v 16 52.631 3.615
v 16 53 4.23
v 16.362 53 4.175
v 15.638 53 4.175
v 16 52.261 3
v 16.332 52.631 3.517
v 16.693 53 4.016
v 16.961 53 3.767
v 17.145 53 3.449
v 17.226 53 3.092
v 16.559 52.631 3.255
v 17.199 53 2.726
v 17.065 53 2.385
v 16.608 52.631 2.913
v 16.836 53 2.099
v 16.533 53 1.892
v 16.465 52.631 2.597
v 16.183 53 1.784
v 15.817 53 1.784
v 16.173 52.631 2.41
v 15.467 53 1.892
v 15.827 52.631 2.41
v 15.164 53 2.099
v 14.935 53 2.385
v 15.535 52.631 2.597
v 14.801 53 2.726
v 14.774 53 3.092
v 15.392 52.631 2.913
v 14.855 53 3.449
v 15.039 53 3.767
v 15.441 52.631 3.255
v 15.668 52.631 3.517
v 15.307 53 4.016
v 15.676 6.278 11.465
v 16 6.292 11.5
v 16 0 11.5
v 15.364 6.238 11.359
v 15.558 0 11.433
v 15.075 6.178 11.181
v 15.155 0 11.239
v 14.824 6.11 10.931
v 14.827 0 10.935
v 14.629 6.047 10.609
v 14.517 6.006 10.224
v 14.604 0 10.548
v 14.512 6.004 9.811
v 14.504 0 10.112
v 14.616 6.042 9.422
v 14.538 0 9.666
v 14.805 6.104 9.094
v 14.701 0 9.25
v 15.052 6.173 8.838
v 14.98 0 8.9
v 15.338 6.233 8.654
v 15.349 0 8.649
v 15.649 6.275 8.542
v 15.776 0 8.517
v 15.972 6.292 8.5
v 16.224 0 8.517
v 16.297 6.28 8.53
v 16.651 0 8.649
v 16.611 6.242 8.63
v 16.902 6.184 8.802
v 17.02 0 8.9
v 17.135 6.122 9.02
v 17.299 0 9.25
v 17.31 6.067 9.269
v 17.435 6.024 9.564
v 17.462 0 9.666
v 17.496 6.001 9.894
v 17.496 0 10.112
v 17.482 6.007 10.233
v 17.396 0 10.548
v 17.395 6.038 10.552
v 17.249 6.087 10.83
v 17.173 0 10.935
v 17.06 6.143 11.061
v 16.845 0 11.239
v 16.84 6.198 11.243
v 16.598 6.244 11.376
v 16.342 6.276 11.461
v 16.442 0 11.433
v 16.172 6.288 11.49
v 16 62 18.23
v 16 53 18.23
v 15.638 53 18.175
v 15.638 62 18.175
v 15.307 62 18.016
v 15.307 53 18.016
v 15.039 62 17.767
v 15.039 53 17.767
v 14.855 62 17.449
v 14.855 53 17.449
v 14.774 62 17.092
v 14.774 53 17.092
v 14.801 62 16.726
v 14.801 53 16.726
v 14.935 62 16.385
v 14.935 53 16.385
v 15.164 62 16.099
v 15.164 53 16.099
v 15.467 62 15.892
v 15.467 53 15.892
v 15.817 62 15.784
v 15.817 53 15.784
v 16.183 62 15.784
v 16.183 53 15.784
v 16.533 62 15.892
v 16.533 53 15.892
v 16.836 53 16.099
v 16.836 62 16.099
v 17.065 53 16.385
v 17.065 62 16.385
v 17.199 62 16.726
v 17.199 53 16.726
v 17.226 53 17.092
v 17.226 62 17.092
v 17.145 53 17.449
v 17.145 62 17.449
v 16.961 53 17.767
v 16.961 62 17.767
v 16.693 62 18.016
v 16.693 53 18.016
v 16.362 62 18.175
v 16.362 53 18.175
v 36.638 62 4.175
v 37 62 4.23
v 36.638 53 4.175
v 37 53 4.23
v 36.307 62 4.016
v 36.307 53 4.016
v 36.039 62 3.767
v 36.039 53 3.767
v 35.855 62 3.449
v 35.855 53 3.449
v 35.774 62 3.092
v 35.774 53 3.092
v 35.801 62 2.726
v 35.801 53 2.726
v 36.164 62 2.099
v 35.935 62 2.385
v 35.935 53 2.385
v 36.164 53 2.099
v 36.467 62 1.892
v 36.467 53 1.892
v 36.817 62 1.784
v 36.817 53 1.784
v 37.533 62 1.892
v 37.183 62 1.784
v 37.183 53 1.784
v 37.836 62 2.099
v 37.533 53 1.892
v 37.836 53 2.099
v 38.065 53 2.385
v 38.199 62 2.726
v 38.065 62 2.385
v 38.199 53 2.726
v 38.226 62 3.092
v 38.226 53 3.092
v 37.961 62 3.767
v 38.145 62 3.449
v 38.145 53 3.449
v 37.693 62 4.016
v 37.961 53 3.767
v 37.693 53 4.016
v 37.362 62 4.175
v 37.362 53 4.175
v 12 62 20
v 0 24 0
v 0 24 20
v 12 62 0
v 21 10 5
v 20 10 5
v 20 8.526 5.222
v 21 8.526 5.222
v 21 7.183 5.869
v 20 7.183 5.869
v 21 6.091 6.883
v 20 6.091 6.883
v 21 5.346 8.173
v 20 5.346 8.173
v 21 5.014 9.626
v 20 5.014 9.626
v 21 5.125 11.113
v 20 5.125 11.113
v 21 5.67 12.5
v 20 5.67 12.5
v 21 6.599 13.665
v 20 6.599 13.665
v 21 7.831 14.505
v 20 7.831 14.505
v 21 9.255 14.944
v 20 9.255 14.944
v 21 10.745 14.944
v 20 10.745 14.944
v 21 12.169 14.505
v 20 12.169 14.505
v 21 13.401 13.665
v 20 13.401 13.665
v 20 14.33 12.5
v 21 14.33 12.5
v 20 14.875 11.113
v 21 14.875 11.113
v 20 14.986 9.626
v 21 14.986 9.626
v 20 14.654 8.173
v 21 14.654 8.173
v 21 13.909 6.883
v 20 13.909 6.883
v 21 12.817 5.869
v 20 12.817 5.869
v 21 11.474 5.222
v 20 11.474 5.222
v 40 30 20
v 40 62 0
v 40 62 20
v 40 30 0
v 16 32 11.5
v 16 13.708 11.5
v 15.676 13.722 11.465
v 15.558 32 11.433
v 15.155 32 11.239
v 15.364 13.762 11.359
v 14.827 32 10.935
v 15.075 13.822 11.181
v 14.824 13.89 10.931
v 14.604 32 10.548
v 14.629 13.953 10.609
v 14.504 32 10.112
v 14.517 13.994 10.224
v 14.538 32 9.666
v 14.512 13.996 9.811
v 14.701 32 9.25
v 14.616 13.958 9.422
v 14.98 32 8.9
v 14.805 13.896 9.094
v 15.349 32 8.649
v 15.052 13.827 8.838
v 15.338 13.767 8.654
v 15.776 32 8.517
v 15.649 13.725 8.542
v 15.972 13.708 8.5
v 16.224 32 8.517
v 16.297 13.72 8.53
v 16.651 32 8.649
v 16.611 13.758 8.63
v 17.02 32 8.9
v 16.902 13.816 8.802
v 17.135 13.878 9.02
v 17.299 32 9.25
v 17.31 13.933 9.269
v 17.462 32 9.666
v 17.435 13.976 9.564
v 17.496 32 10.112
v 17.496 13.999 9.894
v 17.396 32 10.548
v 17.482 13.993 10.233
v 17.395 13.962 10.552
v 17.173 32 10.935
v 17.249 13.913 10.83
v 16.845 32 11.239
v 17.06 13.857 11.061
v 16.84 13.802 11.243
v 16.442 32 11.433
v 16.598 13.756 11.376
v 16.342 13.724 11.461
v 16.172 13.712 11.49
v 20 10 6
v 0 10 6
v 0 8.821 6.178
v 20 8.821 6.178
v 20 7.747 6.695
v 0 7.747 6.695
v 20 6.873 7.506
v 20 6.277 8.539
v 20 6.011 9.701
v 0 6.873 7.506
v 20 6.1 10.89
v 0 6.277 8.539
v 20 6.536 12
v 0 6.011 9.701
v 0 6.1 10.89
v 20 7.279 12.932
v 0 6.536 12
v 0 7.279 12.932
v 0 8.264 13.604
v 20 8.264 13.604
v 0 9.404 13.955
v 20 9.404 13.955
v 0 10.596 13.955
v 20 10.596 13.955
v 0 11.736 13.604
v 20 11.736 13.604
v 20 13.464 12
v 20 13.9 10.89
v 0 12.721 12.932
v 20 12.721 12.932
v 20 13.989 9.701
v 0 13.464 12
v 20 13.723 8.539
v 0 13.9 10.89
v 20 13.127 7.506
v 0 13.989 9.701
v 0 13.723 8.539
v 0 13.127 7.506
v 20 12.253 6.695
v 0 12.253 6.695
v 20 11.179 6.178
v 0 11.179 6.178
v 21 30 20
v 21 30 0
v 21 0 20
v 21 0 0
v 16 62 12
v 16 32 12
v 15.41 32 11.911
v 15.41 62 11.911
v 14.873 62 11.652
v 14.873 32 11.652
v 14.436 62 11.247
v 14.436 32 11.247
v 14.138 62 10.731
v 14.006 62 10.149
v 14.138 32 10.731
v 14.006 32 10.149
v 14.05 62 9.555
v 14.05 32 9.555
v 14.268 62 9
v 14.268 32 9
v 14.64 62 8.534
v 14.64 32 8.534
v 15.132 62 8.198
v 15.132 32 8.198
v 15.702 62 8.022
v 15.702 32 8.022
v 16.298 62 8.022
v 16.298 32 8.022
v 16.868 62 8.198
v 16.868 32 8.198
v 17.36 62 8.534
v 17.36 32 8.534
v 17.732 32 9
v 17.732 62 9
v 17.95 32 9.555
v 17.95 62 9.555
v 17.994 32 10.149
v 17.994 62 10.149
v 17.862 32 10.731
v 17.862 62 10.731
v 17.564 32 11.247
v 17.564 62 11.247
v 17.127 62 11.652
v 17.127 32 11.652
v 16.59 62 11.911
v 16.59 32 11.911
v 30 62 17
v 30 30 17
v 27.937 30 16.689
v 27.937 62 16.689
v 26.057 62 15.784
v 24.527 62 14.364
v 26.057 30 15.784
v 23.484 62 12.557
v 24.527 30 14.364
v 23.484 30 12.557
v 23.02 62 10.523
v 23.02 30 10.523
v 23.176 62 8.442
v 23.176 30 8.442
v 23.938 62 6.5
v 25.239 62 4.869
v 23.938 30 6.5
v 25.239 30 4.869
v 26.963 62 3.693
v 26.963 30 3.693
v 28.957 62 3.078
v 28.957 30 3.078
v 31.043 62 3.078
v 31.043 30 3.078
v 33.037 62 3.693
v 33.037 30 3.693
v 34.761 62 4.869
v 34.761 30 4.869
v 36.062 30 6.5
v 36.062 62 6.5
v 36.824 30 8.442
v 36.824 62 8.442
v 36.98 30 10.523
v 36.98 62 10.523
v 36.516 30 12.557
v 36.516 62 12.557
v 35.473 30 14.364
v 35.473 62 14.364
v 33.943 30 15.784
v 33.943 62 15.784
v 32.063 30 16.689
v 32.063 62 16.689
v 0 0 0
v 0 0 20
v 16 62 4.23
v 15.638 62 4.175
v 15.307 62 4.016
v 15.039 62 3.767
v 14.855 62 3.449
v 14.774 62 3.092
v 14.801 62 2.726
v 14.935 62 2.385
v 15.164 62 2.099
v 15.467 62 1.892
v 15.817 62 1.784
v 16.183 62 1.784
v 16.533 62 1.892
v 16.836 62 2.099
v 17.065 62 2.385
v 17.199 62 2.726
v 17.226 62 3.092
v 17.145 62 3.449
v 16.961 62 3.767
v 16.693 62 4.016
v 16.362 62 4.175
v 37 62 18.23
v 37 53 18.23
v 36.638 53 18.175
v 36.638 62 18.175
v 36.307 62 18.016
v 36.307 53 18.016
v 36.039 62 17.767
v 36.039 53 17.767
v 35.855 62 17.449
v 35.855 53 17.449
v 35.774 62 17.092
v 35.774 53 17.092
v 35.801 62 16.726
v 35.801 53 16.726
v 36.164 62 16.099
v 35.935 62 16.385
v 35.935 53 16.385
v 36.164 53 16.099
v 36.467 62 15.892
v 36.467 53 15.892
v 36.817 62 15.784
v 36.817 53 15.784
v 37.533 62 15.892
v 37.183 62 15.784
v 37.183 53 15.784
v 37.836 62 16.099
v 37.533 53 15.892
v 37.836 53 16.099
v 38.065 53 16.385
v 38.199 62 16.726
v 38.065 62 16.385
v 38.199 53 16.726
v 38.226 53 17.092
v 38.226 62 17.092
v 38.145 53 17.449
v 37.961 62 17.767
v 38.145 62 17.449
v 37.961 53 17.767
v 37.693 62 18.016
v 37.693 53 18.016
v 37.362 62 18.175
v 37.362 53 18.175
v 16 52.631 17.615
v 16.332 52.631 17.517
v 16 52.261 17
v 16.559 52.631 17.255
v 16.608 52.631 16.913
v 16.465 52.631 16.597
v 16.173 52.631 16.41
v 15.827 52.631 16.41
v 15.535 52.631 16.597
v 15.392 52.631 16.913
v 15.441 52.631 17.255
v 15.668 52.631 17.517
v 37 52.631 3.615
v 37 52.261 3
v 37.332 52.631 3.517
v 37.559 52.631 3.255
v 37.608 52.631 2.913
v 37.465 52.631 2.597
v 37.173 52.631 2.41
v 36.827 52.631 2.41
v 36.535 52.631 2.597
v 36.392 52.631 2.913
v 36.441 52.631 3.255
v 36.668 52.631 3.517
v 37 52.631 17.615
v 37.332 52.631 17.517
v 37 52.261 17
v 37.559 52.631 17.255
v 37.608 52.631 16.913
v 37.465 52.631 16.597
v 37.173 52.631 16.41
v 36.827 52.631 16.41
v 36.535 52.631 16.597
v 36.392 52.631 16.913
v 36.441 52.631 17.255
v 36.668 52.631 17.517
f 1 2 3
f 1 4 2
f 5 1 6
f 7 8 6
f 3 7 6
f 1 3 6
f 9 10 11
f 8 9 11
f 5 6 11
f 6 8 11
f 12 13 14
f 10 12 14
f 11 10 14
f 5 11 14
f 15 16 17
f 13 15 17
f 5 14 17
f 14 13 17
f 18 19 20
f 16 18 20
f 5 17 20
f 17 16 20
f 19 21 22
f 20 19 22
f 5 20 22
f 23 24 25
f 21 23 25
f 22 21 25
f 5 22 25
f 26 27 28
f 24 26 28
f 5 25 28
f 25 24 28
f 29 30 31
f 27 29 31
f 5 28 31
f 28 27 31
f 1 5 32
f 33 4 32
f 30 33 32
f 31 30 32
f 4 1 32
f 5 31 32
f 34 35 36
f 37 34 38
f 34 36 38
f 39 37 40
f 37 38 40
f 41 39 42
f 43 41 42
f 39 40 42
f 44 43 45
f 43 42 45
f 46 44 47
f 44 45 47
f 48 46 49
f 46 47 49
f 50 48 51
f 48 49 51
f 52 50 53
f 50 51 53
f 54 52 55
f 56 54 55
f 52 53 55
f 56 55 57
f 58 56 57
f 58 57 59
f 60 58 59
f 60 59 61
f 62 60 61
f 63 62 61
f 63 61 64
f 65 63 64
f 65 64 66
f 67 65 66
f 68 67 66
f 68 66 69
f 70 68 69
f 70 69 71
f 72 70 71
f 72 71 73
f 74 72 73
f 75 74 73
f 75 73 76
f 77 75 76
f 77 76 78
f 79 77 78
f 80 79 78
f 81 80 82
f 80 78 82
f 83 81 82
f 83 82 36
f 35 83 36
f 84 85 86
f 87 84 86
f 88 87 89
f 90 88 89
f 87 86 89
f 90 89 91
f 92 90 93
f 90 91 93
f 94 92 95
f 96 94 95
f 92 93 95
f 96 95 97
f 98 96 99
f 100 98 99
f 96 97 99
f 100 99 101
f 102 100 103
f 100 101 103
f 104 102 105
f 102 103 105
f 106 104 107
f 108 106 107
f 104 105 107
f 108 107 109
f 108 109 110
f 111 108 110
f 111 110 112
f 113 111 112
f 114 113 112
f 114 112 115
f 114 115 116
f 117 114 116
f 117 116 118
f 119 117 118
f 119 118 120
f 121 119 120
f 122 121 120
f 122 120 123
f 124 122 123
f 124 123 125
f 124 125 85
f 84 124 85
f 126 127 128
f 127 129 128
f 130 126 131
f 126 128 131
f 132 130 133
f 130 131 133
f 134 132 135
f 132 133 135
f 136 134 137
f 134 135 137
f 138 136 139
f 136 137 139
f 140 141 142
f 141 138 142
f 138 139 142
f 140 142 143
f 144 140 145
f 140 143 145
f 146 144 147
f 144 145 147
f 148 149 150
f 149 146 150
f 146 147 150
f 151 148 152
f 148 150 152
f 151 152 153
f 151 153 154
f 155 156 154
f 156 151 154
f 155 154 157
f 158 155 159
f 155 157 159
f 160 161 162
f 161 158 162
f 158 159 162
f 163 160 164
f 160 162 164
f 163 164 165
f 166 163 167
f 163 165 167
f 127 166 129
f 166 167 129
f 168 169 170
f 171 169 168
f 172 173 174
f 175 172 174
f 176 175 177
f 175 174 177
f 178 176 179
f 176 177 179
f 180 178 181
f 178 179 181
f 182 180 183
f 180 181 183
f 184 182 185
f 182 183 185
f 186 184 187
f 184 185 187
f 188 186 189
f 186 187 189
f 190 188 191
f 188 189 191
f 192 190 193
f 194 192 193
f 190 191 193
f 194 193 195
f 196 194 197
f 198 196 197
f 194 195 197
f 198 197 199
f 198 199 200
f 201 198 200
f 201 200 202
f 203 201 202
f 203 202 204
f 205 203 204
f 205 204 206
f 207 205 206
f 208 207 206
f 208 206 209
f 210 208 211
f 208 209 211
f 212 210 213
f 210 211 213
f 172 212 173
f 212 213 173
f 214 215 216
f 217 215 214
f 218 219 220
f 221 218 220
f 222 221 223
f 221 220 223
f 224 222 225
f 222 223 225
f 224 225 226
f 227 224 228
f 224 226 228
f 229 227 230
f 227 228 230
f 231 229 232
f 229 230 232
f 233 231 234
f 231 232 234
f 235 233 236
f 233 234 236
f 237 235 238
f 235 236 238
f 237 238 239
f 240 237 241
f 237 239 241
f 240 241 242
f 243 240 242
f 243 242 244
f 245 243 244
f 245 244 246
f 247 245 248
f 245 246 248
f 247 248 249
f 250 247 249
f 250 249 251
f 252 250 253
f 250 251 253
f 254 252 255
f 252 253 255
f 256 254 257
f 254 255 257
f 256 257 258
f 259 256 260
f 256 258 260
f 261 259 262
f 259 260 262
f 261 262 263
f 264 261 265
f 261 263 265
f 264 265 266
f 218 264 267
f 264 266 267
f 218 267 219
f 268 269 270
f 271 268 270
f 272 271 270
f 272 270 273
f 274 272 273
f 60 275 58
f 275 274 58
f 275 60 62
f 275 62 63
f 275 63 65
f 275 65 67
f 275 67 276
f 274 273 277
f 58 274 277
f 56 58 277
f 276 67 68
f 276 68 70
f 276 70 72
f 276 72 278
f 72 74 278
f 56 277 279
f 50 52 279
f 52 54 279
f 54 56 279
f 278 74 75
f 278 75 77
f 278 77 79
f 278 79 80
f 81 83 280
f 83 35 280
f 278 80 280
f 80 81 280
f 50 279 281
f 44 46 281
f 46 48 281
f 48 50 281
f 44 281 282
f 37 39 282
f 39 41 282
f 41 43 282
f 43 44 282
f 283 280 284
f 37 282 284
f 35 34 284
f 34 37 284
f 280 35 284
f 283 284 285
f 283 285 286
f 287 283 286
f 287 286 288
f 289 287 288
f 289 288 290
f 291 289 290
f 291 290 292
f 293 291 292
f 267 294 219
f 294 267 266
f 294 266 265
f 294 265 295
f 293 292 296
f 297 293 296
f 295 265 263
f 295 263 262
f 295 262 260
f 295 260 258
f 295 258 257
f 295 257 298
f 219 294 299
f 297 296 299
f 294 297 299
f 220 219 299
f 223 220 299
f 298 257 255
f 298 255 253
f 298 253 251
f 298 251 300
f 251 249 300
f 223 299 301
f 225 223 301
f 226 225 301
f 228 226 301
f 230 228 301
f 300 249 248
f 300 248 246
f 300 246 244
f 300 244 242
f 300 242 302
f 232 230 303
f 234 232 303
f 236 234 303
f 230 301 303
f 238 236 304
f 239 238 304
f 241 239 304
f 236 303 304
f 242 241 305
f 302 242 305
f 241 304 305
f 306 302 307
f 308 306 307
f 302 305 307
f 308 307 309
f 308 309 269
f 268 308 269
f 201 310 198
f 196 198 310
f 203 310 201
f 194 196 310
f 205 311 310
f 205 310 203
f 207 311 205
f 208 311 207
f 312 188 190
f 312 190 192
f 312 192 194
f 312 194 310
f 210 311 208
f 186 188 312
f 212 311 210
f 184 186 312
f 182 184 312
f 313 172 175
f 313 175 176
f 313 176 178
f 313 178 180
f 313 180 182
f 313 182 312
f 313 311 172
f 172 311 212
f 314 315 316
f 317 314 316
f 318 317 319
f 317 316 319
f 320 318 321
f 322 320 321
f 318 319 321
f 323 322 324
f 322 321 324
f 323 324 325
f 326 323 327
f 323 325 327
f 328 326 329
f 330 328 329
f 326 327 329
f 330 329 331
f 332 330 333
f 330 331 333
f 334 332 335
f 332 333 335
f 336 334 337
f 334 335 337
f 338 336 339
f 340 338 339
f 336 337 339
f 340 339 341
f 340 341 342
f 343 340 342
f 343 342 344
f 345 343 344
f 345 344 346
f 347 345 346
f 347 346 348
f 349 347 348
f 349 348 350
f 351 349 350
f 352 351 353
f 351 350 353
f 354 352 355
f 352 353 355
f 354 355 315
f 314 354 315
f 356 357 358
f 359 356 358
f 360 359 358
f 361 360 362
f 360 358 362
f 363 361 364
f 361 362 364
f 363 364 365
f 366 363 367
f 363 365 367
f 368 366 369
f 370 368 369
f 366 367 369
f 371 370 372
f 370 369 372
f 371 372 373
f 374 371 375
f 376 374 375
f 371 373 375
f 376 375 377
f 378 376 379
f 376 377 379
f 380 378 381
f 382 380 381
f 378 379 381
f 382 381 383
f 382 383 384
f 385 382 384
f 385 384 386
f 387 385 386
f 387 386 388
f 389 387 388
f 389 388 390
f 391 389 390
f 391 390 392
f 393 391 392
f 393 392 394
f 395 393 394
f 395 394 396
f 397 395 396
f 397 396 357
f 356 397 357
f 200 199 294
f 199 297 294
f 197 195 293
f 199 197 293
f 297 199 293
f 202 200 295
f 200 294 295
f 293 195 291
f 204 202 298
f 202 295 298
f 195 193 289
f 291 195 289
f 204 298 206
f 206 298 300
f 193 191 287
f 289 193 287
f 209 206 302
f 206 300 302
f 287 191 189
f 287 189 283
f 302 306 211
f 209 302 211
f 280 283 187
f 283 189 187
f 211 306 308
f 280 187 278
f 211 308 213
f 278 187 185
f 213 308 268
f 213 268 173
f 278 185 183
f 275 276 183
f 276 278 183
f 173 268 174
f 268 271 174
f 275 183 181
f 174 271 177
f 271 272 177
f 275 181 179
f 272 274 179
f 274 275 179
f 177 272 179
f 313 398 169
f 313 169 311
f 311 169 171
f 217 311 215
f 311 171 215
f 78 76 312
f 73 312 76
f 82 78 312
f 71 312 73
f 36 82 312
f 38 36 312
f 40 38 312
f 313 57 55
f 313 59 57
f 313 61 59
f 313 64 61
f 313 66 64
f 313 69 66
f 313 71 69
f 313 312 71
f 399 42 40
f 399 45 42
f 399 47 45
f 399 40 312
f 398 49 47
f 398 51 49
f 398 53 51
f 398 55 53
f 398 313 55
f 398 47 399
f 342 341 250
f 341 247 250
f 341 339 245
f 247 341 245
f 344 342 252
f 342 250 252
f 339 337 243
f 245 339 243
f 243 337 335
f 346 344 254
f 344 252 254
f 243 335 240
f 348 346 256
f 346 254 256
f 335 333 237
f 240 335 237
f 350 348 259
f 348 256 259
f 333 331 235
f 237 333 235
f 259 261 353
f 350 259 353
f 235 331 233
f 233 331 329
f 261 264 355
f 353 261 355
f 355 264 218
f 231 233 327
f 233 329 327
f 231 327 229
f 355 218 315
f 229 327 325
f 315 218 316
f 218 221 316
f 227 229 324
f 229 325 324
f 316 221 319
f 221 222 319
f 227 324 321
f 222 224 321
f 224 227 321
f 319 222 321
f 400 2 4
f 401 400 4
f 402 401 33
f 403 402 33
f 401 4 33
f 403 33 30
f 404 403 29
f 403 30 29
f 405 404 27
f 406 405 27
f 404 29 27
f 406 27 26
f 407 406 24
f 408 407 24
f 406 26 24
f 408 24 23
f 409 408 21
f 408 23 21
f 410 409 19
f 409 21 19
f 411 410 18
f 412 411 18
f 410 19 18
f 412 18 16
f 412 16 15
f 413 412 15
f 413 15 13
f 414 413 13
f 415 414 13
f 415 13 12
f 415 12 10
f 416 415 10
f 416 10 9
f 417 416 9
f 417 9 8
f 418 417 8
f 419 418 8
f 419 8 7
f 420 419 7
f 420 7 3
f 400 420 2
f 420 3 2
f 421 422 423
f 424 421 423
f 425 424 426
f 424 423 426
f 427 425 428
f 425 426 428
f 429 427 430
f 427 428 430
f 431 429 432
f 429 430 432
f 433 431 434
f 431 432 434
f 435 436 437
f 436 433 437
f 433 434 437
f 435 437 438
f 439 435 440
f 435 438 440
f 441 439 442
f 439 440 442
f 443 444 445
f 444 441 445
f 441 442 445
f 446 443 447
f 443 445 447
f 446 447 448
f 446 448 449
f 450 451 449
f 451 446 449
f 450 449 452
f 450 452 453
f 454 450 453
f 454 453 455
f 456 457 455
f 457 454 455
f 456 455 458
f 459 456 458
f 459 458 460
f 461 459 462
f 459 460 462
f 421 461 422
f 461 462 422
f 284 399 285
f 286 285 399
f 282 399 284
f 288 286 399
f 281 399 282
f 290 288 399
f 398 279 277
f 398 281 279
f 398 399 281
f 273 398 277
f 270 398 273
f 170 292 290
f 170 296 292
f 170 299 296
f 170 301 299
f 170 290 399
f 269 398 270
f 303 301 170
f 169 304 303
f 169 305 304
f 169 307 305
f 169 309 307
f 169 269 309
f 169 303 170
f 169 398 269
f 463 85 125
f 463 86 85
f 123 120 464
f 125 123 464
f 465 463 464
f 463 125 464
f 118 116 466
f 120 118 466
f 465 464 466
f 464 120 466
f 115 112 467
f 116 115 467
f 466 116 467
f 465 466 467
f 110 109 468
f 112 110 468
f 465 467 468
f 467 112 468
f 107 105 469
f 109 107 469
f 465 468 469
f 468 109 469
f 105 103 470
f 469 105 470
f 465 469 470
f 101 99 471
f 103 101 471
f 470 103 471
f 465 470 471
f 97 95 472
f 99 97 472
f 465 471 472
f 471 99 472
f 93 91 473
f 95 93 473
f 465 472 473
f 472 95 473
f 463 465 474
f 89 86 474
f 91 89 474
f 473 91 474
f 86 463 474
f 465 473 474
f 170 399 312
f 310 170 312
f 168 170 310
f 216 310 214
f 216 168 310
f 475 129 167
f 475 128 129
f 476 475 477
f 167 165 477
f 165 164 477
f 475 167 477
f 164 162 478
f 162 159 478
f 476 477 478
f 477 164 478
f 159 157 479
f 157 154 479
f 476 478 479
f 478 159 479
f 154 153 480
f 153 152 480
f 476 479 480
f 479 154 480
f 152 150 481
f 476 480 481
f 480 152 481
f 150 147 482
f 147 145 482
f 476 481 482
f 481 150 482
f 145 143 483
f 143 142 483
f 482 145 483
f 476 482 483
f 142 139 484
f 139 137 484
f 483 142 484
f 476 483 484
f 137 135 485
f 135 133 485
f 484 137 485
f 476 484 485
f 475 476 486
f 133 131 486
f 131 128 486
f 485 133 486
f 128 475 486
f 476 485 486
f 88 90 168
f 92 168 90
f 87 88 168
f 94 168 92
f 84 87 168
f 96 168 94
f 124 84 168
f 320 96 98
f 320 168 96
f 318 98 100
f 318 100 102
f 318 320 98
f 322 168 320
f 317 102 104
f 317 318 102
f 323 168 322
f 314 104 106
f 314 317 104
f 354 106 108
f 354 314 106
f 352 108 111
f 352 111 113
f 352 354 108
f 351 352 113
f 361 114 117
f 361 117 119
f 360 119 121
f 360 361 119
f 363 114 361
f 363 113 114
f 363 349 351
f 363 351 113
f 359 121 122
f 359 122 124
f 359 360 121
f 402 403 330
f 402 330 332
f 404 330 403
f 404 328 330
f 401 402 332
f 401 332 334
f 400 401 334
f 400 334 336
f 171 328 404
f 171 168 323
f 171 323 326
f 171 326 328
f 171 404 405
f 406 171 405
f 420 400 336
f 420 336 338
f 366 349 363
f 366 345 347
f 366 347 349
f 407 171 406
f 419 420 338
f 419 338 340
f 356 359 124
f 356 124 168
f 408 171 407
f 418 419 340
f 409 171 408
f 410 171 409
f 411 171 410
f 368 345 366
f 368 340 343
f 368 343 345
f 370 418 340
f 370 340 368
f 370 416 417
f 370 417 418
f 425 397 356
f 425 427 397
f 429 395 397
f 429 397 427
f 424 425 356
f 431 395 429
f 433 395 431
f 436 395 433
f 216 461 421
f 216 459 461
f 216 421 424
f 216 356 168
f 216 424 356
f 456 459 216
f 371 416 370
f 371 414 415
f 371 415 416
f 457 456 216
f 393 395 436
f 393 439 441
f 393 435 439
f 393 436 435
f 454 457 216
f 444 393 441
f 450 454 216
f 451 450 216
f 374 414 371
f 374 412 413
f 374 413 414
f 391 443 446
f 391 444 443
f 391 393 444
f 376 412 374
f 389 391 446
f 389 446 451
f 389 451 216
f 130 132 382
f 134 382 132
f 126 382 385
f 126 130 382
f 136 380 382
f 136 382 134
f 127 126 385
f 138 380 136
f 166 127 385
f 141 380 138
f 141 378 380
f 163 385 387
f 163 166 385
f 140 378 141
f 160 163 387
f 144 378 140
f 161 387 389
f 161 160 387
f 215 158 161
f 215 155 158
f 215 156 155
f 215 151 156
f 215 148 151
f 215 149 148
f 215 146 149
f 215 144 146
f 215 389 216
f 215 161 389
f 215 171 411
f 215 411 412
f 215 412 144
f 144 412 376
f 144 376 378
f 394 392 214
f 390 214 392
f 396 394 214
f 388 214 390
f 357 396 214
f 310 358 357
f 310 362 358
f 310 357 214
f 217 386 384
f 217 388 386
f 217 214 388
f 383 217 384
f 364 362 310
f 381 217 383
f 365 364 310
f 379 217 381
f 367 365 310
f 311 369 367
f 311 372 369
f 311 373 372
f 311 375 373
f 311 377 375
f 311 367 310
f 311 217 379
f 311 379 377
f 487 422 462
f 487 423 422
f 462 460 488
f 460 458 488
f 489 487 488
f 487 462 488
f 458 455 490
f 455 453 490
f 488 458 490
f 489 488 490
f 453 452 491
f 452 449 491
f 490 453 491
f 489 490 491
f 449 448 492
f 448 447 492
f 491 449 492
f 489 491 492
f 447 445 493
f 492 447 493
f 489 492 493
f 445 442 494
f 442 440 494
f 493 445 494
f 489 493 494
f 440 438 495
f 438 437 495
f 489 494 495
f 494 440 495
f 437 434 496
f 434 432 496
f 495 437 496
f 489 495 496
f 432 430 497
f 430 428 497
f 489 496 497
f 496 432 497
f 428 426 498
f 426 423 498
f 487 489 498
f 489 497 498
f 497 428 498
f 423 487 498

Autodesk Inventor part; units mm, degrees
ref_plane "XY Plane" through (0, 0, 0) normal (0, 0, 1) x (1, 0, 0)
sketch "Skizze1" plane through (0, 0, 0) normal (0, 0, 1) x (1, 0, 0)
  line L0 (0, 0) -> (0, 24)
  line L1 (0, 24) -> (12, 62)
  line L2 (12, 62) -> (40, 62)
  line L3 (40, 62) -> (40, 30)
  line L4 (40, 30) -> (21, 30)
  line L5 (21, 30) -> (21, 0)
  line L6 (21, 0) -> (0, 0)
  dimension "d0" = 62
  dimension "d1" = 21
  dimension "d2" = 30
  dimension "d3" = 38
  dimension "d4" = 28
  dimension "d5" = 12
extrude "Extrusion1" add sketch "Skizze1" along normal blind 20
sketch "Skizze3" plane through (12, 62, 0) normal (0, 1, 0) x (1, 0, 0)
  line L0 (0, 0) -> (0, -20) projected
  line L1 (28, 0) -> (28, -20) projected
  point P0 (-12, 0)
  point P1 (18, -10)
  point P2 (28, -10)
  dimension "d16" = 10
hole "Bohrung2" at (30, 62, 10) direction (0, -1, 0) diameter 14 end through all
sketch "Skizze4" plane through (12, 62, 0) normal (0, 1, 0) x (1, 0, 0)
  line L0 (0, 0) -> (0, -20) projected
  line L1 (28, 0) -> (28, -20) projected
  point P0 (-12, 0)
  point P1 (4, -10)
  point P2 (28, -10)
  dimension "d24" = 4
hole "Bohrung3" at (16, 62, 10) direction (0, -1, 0) diameter 3 depth 62 counterbore diameter 4 counterbore depth 30
sketch "Skizze5" plane through (21, 0, 0) normal (1, 0, 0) x (0, 0, -1)
  line L0 (0, 0) -> (-20, 0) projected
  point P0 (-10, 10)
  point P1 (-10, 0)
  dimension "d32" = 10
hole "Bohrung4" at (21, 10, 10) direction (-1, 0, 0) diameter 8 depth 21 counterbore diameter 10 counterbore depth 1
ref_plane "Arbeitsebene1" through (0, 12, 0) normal (0, 1, 0) x (-1, 0, 0)
sketch "Skizze8" plane through (12, 62, 0) normal (0, 1, 0) x (1, 0, 0)
  circle A0 centre (4, -10) radius 2 projected
  circle A1 centre (18, -10) radius 7 projected
  line L0 (28, 0) -> (0, 0) projected
  line L1 (0, 0) -> (0, -20) projected
  line L2 (28, -20) -> (0, -20) projected
  line L3 (28, 0) -> (28, -20) projected
  line L4 (4, -10) -> (4, -3) construction
  line L5 (4, -10) -> (4, -17) construction
  line L6 (18, -10) -> (9, -10) construction
  line L7 (9, 0) -> (9, -20) projected
  point P0 (-12, 0)
  dimension "d57" = 14
hole "Bohrung7" at (16, 62, 17) at (16, 62, 3) direction (0, -1, 0) diameter 2.459 depth 9 tip angle 118 thread size "M3x0.5" class "6H" standard "ISO Metric profile"
ref_plane "Arbeitsebene2" through (26.5, 0, 0) normal (1, 0, 0) x (0, 1, 0)
mirror "Spiegeln2" about plane through (26.5, 0, 0) normal (1, 0, 0) of "Bohrung7"
properties part number "MotorBlock" material "Glas"
